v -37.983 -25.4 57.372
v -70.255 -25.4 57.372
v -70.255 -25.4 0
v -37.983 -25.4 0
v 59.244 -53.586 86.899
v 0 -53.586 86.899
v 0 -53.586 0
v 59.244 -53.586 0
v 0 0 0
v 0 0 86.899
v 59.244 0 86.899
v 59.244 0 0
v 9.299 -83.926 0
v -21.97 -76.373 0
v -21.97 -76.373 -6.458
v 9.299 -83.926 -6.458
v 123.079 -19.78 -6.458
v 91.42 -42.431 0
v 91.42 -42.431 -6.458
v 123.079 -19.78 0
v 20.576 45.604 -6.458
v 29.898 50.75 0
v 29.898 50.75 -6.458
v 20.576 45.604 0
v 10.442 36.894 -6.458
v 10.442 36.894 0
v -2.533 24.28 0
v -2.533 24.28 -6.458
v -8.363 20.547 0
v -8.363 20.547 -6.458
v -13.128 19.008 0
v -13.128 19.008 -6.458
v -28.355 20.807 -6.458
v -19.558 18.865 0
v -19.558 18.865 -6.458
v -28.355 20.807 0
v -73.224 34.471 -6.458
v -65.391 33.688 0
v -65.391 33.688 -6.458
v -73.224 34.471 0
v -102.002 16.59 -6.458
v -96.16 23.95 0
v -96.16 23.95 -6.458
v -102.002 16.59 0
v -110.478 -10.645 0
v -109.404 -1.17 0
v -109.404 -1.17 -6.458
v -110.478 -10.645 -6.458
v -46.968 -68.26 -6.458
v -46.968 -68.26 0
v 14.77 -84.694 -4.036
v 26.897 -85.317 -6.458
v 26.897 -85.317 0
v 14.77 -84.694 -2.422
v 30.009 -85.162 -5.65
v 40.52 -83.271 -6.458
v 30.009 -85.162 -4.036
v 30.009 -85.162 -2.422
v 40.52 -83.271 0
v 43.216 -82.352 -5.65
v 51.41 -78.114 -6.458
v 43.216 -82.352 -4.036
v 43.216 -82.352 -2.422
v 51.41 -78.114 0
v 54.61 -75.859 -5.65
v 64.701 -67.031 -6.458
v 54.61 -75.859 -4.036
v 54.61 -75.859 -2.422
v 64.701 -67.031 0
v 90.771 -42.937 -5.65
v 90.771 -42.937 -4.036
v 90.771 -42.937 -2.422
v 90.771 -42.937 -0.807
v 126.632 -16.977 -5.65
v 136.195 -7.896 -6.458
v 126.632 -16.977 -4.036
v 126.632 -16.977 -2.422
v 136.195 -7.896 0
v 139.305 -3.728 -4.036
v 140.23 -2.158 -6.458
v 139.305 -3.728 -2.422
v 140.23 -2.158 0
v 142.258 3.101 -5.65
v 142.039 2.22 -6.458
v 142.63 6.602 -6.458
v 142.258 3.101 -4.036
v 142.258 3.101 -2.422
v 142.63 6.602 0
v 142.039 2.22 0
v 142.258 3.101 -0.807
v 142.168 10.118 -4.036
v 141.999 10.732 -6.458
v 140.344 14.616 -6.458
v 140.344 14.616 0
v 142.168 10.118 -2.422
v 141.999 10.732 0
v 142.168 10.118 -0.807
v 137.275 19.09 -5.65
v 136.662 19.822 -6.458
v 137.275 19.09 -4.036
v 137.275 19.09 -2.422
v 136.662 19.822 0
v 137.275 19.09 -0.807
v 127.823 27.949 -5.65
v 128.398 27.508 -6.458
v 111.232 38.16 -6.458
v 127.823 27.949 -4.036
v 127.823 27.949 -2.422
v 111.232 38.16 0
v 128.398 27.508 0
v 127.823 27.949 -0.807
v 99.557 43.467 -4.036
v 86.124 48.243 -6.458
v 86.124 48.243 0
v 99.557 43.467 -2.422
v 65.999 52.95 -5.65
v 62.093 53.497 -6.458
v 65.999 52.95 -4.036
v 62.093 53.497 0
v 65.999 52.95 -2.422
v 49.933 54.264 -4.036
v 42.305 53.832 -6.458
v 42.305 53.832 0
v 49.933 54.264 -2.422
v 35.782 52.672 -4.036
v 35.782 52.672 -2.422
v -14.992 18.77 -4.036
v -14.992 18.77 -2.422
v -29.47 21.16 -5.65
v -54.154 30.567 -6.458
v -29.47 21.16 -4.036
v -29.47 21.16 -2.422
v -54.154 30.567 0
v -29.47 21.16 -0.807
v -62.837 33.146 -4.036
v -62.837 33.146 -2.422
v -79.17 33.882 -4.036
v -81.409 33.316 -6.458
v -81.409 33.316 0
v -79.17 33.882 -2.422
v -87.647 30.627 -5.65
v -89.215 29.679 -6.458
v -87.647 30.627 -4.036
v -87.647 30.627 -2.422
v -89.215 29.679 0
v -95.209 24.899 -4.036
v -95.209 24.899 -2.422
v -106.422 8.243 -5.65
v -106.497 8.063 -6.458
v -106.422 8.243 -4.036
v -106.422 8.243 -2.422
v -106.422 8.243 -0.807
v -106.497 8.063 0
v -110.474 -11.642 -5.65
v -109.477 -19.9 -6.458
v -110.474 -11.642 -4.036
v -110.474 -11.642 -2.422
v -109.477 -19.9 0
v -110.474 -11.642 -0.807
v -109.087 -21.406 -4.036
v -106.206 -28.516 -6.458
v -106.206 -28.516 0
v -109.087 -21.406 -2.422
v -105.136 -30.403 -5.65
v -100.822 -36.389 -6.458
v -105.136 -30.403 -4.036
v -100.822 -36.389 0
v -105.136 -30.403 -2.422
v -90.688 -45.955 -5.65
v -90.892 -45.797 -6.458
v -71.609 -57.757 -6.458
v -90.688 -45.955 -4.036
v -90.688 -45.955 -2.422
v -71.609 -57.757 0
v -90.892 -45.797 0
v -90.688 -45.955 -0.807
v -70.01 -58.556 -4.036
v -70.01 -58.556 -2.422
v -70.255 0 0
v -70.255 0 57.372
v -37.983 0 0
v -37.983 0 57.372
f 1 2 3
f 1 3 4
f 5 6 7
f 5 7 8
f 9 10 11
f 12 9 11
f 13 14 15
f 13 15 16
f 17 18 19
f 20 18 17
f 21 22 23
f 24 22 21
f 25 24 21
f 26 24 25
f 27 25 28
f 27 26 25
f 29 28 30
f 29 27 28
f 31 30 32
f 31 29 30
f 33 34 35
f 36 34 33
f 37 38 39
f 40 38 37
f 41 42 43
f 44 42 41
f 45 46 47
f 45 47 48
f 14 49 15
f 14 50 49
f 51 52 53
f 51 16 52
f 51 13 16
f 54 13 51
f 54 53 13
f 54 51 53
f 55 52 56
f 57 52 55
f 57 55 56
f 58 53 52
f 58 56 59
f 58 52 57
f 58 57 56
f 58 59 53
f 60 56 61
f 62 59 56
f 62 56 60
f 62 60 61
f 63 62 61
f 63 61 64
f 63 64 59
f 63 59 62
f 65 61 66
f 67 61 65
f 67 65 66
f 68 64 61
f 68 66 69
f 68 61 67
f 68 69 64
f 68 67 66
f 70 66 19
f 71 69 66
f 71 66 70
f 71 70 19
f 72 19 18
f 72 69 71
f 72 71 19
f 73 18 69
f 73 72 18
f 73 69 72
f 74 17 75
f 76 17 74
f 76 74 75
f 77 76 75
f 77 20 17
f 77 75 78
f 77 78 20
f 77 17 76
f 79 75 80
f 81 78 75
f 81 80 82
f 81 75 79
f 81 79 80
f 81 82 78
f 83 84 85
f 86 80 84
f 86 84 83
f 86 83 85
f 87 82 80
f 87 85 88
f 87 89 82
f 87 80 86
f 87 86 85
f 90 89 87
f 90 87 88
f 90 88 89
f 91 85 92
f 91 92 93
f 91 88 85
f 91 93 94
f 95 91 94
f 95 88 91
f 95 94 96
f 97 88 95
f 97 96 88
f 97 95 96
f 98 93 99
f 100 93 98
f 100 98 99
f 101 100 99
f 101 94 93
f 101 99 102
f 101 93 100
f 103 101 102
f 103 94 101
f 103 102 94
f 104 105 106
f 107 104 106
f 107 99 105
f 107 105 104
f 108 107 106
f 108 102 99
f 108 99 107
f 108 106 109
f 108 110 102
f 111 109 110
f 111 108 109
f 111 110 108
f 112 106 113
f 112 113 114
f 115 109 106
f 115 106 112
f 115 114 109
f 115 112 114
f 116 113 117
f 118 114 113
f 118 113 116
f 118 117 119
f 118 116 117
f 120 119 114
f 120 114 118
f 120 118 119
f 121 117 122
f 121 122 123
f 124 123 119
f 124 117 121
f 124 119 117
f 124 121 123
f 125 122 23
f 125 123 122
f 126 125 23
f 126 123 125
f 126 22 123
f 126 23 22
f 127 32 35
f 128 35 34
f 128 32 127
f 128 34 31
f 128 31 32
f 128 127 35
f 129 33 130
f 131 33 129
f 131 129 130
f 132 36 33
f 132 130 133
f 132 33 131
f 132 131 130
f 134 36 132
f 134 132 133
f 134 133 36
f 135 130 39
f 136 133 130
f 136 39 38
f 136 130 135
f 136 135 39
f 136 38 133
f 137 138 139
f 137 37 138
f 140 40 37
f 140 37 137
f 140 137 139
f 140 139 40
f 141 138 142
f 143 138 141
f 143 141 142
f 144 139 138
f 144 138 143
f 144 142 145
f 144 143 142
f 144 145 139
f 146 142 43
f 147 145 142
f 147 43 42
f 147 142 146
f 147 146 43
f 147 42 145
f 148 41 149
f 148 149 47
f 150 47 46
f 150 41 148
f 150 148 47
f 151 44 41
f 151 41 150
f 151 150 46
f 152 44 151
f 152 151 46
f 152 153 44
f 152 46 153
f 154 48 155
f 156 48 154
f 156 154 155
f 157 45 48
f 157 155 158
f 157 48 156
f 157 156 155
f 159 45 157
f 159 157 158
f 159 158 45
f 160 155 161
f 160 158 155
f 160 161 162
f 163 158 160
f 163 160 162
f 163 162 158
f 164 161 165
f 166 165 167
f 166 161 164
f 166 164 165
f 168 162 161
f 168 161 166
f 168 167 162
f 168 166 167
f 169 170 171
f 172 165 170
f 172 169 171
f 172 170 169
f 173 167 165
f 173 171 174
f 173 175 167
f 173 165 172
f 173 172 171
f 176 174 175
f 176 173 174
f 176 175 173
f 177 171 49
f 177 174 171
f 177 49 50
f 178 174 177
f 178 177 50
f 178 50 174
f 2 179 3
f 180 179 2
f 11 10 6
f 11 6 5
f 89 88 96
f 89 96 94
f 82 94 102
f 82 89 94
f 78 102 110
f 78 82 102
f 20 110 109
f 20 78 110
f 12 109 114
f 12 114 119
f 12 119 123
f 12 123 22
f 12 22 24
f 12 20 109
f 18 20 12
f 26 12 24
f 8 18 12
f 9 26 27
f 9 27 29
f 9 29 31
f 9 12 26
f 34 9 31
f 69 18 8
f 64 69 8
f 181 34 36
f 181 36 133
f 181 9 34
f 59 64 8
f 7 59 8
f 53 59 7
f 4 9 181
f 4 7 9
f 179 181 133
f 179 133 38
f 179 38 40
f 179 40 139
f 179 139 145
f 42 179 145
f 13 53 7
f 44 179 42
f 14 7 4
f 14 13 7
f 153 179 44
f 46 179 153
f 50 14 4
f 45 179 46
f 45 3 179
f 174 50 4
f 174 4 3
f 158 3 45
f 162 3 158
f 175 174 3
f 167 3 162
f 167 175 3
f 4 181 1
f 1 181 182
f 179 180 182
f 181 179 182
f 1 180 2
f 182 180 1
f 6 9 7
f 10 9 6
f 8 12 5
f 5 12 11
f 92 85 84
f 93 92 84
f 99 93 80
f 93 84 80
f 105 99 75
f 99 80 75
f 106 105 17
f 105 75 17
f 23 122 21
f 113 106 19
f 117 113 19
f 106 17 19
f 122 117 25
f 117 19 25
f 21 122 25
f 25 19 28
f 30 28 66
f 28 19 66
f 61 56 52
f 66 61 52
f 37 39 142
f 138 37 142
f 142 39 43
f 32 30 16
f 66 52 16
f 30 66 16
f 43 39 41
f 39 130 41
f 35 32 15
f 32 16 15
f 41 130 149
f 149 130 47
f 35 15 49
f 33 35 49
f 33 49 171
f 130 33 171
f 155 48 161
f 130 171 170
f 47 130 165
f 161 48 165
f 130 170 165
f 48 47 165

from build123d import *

# Parameters (mm, degrees)
F0_W     = 59.2442452908
F0_H     = 86.8994742632
F1_DEPTH = 53.58551
F2_W     = 32.2711616755
F2_H     = 57.3722757399
F3_DEPTH = 25.4
F4_W     = 32.2711616755
F4_H     = 25.4
F4_W_2   = 59.2442452908
F4_H_2   = 53.58551
F5_DEPTH = 6.45768


with BuildPart() as f1:
    # F0 (on Front) → F1 (new body)
    with BuildSketch(Plane.XZ):
        with Locations((29.6221226454, 43.4497371316)):
            Rectangle(F0_W, F0_H)
    extrude(amount=F1_DEPTH)



with BuildPart() as f3:
    # F2 (on Front) → F3 (new body)
    with BuildSketch(Plane.XZ):
        with Locations((-54.119028151, 28.68613787)):
            Rectangle(F2_W, F2_H)
    extrude(amount=F3_DEPTH)


with BuildPart() as f1_1:
    add(f1.part)

    add(f3.part)  # F5 merges F3
    # F4 (on face) → F5 (join)
    with BuildSketch(Plane(origin=(0, 0, 0), x_dir=(1, 0, 0), z_dir=(0, 0, -1))):
        with BuildLine():
            add(Edge.make_bspline(
                [(-21.9703670591, 76.3727575541), (6.0006067765, 84.5706837974), (48.8939489341, 92.740552183), (82.2950265666, 40.4636833627), (189.2732342742, -11.7593615973), (22.2865377101, -80.9884135333), (-5.5735611462, 4.7958526844), (-83.7690629855, -59.8091662524), (-135.3205861901, 36.9469152542), (-56.736577739, 66.1832363529), (-21.9703670591, 76.3727575541)],
                knots=[0, 0, 0, 0, 0.1177911746, 0.2302007419, 0.3543006643, 0.5088619105, 0.6203626236, 0.7389379751, 0.8535927703, 1, 1, 1, 1], degree=3))
        make_face()
        with Locations((-54.119028151, 12.7)):
            Rectangle(F4_W, F4_H, mode=Mode.SUBTRACT)
        with Locations((29.6221226454, 26.792755)):
            Rectangle(F4_W_2, F4_H_2, mode=Mode.SUBTRACT)
        with Locations((29.6221226454, 26.792755)):
            Rectangle(F4_W_2, F4_H_2)
        with Locations((-54.119028151, 12.7)):
            Rectangle(F4_W, F4_H)
    extrude(amount=F5_DEPTH)


solid = f1_1.part
